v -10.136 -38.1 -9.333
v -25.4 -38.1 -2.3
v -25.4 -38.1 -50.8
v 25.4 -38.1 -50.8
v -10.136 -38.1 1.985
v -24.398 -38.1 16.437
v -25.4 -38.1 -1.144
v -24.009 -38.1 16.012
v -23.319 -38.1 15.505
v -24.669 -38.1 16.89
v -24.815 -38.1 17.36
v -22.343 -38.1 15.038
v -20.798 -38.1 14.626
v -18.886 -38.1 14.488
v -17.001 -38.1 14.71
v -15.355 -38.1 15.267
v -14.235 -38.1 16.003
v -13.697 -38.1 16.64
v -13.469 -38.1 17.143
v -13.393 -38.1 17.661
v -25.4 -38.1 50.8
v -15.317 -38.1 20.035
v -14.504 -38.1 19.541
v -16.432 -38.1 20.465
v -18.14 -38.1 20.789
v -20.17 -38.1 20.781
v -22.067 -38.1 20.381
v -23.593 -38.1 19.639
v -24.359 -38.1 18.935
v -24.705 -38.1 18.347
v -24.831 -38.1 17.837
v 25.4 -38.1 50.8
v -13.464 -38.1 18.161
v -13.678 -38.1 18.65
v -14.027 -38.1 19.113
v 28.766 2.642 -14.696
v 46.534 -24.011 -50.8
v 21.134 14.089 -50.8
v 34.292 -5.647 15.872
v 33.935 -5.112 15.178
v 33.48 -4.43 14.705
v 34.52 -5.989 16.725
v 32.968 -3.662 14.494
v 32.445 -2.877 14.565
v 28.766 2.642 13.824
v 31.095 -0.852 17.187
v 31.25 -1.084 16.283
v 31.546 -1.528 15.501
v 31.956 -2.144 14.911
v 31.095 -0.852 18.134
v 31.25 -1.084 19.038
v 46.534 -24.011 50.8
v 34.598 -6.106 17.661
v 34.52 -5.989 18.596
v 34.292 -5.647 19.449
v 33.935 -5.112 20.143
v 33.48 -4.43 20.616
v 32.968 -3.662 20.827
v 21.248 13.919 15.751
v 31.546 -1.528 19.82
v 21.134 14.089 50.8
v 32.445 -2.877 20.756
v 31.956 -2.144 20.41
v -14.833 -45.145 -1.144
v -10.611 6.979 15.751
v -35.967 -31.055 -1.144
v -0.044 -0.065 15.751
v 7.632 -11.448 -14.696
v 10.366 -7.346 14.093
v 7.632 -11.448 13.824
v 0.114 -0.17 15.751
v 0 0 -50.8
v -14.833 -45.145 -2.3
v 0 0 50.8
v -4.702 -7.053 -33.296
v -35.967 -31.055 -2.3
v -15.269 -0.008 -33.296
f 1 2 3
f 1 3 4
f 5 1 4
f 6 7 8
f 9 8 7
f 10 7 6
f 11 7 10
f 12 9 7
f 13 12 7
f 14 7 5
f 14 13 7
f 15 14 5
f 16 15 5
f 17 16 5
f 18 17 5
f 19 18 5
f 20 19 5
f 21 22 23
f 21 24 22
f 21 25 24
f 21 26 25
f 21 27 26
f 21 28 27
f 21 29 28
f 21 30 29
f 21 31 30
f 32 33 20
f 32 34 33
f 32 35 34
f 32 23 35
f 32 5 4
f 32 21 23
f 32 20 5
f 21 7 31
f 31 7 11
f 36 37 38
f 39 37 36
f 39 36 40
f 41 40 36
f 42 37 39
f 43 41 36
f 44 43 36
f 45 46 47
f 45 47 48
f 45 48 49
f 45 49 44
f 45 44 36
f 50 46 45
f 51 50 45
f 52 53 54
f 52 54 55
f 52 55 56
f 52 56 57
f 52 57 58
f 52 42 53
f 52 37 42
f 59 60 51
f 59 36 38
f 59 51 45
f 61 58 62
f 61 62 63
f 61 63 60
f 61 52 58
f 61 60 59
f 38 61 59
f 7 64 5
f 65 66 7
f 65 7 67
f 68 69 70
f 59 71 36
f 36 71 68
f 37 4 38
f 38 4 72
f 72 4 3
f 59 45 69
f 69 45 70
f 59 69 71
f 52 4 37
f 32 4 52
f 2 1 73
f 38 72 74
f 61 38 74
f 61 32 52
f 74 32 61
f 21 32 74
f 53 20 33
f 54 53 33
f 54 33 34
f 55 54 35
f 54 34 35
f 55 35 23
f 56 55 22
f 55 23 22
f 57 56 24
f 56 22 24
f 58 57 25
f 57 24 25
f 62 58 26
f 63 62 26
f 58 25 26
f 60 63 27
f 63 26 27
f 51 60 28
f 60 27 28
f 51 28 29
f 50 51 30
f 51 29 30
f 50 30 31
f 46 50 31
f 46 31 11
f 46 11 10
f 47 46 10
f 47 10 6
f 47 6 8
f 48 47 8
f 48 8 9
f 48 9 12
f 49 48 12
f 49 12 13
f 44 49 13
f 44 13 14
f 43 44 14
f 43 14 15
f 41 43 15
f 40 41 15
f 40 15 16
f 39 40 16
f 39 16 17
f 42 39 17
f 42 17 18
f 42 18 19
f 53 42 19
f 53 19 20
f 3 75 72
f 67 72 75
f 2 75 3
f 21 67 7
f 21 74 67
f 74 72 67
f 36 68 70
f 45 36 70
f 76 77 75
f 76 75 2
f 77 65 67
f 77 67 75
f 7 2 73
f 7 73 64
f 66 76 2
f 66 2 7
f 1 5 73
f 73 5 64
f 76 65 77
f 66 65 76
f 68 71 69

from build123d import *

# Parameters (mm, degrees)
F1_DEPTH = 50.8
F3_DEPTH = 12.7
F4_W     = 45.7905011984
F4_H     = 101.6
F4_R     = 12.307725437
F4_R_2   = 8.8836456499
F5_DEPTH = 25.4
F7_D     = 6.35


with BuildPart() as f1:
    # F0 (on Top) → F1 (new body, symmetric)
    with BuildSketch(Plane.XY):
        Polygon((25.4, -38.1), (0, 0), (-25.4, -38.1), align=None)
    extrude(amount=F1_DEPTH, both=True)

    # F2 (on face) → F3 (join, symmetric)
    with BuildSketch(Plane(origin=(0, 0, 0), x_dir=(-0.5547001962, -0.8320502943, 0), z_dir=(-0.8320502943, 0.5547001962, 0))):
        Polygon((45.7905011984, -1.1443360425), (0.0787186434, 15.7506404887), (8.4762908518, -33.2957603969), (45.7905011984, -2.2995244172), align=None)
    extrude(amount=F3_DEPTH, both=True)

    # F4 (on face) → F5 (join)
    with BuildSketch(Plane(origin=(0, 0, 0), x_dir=(-0.5547001962, 0.8320502943, 0), z_dir=(0.8320502943, 0.5547001962, 0))):
        with Locations((-22.8952505992, 0)):
            Rectangle(F4_W, F4_H)
        with Locations((-26.547158137, -29.2638558894)):
            Circle(F4_R, mode=Mode.SUBTRACT)
        with Locations((-24.961175397, -4.7561856918)):
            Circle(F4_R_2, mode=Mode.SUBTRACT)
        Polygon((-13.7583333333, -14.695818583), (-13.7583333333, 13.8239461095), (-0.2046684728, 15.7506404887), align=None, mode=Mode.SUBTRACT)
        with Locations((-26.547158137, -29.2638558894)):
            Circle(F4_R)
        with Locations((-24.961175397, -4.7561856918)):
            Circle(F4_R_2)
    extrude(amount=F5_DEPTH)

    # F7 (through all)
    with Locations(Plane(origin=(21.1340774762, 14.0893849841, 0), x_dir=(-0.5547001962, 0.8320502943, 0), z_dir=(0.8320502943, 0.5547001962, 0))):
        with Locations((-21.0971944034, 17.6605209708)):
            Hole(F7_D / 2)


solid = f1.part
